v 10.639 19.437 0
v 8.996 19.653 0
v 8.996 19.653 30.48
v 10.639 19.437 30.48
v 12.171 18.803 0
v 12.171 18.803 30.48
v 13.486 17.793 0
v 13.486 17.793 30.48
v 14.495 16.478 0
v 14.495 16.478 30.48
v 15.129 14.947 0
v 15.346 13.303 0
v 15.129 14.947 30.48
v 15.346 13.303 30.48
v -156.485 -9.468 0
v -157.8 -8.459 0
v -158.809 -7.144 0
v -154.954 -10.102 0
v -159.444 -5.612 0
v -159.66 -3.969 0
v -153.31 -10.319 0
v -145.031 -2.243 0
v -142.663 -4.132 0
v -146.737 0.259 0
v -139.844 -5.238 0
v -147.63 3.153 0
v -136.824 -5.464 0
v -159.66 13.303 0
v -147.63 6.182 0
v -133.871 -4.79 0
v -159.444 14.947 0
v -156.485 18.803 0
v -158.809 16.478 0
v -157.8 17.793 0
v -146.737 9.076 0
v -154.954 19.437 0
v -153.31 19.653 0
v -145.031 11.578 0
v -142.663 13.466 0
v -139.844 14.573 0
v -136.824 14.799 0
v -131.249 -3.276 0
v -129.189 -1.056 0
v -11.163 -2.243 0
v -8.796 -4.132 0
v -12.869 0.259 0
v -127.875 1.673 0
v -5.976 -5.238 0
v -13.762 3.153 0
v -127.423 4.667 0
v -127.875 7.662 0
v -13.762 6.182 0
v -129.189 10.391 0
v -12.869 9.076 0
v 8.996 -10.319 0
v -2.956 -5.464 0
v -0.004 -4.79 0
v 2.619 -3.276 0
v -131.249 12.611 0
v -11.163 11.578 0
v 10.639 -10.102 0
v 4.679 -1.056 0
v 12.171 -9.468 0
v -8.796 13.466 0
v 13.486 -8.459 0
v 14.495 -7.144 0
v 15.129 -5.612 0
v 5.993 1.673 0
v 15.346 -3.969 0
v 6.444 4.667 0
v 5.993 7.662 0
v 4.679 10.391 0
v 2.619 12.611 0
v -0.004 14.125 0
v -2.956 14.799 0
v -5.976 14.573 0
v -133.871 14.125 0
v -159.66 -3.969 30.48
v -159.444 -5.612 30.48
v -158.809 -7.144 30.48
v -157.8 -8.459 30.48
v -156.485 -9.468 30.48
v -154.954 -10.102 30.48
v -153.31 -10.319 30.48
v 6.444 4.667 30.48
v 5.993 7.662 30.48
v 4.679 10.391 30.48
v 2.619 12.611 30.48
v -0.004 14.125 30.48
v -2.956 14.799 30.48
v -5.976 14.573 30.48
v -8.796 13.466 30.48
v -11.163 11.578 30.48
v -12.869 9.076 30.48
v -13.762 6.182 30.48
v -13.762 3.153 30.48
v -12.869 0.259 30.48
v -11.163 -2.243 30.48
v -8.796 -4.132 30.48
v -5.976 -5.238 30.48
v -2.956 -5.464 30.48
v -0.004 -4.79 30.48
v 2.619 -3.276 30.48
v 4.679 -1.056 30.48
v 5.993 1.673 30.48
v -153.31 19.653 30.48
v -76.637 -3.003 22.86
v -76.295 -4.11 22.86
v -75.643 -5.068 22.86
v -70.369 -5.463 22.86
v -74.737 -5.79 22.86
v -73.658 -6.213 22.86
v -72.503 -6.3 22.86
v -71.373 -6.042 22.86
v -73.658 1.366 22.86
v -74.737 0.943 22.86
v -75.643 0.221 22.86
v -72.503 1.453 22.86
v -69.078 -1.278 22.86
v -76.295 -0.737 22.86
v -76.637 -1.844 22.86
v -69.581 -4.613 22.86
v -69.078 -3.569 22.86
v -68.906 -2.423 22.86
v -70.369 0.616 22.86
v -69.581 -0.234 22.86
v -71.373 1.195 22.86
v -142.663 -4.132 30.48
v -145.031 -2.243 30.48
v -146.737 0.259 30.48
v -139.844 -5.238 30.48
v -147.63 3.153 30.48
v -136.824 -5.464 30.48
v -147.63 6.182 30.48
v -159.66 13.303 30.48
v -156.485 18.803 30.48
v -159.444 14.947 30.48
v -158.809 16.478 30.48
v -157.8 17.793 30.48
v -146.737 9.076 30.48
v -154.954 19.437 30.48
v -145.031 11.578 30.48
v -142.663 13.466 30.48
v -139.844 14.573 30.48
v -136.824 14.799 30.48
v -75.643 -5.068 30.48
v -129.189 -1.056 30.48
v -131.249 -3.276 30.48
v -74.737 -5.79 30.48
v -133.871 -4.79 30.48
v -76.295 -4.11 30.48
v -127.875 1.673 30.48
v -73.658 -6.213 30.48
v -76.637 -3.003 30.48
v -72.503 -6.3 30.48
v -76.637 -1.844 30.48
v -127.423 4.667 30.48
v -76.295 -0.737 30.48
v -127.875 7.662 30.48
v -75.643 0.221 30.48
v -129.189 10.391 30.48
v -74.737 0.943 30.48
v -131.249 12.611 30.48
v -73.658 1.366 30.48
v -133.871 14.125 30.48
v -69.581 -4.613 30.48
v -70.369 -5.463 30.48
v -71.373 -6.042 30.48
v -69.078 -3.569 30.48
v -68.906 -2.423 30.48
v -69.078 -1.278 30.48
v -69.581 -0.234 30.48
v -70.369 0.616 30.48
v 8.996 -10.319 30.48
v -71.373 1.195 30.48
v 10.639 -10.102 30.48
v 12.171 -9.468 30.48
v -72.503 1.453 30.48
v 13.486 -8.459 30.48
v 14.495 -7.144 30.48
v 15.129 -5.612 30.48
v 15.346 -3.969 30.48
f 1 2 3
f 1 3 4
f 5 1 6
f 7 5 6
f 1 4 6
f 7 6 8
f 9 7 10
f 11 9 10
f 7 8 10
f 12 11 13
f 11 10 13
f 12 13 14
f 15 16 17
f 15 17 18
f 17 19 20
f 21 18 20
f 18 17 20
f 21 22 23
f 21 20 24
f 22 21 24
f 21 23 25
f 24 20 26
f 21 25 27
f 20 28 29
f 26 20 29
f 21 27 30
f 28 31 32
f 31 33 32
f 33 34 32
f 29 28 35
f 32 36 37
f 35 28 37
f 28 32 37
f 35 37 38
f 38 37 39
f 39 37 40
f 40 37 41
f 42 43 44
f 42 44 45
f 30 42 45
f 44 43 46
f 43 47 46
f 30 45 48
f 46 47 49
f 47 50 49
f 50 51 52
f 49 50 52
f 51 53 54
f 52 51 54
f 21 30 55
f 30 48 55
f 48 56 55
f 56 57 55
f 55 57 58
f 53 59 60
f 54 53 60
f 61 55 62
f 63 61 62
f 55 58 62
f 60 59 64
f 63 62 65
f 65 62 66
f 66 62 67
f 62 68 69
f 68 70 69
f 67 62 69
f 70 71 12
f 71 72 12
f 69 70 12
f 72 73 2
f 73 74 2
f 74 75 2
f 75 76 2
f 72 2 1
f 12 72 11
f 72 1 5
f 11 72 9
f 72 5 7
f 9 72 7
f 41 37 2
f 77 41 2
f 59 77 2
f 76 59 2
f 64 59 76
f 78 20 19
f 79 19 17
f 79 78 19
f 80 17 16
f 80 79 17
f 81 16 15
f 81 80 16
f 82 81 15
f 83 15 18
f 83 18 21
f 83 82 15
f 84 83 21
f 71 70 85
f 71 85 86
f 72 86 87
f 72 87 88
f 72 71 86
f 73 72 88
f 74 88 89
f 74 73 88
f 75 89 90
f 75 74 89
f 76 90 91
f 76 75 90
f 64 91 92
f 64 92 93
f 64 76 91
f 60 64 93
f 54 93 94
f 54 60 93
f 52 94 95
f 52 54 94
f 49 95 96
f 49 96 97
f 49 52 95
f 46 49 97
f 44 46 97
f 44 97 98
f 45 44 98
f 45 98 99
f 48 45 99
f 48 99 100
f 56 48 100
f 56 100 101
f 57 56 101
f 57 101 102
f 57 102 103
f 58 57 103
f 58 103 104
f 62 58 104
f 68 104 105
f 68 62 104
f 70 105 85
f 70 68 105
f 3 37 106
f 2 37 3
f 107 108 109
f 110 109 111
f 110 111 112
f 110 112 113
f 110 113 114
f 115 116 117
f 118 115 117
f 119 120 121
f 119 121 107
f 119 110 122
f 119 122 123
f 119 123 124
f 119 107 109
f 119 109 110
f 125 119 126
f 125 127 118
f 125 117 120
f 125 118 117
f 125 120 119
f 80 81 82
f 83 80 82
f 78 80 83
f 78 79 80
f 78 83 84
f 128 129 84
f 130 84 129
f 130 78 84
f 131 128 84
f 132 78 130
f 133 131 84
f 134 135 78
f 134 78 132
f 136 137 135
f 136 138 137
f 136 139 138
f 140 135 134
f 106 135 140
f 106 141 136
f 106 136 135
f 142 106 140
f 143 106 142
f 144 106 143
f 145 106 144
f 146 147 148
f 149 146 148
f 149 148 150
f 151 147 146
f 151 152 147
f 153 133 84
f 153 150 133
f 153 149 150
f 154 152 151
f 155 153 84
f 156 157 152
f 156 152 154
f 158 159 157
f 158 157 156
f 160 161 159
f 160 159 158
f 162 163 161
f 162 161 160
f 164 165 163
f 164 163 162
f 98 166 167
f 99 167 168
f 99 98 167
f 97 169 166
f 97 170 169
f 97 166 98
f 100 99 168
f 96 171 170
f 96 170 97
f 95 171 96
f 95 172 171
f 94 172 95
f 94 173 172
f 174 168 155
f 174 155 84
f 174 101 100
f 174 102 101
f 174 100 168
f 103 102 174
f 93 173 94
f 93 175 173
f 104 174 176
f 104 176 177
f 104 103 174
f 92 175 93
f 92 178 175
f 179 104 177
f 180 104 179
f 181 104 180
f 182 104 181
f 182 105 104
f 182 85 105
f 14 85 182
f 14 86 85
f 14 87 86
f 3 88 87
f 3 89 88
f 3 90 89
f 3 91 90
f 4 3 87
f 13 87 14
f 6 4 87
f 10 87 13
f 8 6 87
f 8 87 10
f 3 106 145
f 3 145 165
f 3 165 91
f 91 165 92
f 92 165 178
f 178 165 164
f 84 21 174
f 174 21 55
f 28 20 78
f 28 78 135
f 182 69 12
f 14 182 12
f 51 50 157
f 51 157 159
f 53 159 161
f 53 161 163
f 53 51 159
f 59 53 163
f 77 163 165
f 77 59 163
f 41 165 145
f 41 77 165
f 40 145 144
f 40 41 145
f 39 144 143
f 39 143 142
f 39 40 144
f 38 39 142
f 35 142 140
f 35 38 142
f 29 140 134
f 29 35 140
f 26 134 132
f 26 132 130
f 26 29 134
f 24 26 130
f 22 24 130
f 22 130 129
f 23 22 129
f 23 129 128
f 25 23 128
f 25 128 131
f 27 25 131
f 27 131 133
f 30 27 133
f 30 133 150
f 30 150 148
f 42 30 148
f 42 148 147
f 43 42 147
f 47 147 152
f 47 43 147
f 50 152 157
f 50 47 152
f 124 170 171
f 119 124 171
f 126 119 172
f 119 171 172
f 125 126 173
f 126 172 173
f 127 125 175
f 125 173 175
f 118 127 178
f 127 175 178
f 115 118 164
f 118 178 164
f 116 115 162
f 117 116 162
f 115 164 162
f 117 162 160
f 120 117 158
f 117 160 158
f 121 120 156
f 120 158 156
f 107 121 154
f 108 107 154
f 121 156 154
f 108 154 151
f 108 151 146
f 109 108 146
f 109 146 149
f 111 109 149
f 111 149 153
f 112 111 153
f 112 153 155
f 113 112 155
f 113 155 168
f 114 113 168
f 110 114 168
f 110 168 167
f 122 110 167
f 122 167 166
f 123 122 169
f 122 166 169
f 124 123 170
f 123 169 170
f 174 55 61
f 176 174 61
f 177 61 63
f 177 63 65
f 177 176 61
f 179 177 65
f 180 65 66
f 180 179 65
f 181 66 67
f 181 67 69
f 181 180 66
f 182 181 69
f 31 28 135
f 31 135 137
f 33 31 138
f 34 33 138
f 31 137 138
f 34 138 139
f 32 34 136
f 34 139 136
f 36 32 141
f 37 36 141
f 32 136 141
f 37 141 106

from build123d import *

# Parameters (mm, degrees)
SKETCH5_W            = 175.006
SKETCH5_H            = 29.972
SKETCH5_R            = 10.16
BOSS_EXTRUDE11_DEPTH = 30.48
SKETCH7_R            = 3.887338421
CUT_EXTRUDE6_DEPTH   = 7.62
FILLET1_R            = 6.35


with BuildPart() as part:
    # Sketch5 → Boss-Extrude11 (new body)
    with BuildSketch(Plane.XY):
        with Locations((-72.157166667, 4.66725)):
            Rectangle(SKETCH5_W, SKETCH5_H)
        with Locations((-137.583333333, 4.66725)):
            Circle(SKETCH5_R, mode=Mode.SUBTRACT)
        with Locations((-3.715568727, 4.66725)):
            Circle(SKETCH5_R, mode=Mode.SUBTRACT)
    extrude(amount=BOSS_EXTRUDE11_DEPTH)

    # Sketch7 → Cut-Extrude6 (cut)
    with BuildSketch(Plane.XY.offset(30.48)):
        with Locations((-72.793003422, -2.423465595)):
            Circle(SKETCH7_R)
    extrude(amount=-CUT_EXTRUDE6_DEPTH, mode=Mode.SUBTRACT)

    # Fillet1
    fillet1_edges = [part.edges().sort_by_distance(p)[0] for p in [
        (15.345833333, -10.31875, 15.24),
        (-159.660166667, -10.31875, 15.24),
        (-159.660166667, 19.65325, 15.24),
        (15.345833333, 19.65325, 15.24),
    ]]
    fillet(fillet1_edges, radius=FILLET1_R)


solid = part.part
